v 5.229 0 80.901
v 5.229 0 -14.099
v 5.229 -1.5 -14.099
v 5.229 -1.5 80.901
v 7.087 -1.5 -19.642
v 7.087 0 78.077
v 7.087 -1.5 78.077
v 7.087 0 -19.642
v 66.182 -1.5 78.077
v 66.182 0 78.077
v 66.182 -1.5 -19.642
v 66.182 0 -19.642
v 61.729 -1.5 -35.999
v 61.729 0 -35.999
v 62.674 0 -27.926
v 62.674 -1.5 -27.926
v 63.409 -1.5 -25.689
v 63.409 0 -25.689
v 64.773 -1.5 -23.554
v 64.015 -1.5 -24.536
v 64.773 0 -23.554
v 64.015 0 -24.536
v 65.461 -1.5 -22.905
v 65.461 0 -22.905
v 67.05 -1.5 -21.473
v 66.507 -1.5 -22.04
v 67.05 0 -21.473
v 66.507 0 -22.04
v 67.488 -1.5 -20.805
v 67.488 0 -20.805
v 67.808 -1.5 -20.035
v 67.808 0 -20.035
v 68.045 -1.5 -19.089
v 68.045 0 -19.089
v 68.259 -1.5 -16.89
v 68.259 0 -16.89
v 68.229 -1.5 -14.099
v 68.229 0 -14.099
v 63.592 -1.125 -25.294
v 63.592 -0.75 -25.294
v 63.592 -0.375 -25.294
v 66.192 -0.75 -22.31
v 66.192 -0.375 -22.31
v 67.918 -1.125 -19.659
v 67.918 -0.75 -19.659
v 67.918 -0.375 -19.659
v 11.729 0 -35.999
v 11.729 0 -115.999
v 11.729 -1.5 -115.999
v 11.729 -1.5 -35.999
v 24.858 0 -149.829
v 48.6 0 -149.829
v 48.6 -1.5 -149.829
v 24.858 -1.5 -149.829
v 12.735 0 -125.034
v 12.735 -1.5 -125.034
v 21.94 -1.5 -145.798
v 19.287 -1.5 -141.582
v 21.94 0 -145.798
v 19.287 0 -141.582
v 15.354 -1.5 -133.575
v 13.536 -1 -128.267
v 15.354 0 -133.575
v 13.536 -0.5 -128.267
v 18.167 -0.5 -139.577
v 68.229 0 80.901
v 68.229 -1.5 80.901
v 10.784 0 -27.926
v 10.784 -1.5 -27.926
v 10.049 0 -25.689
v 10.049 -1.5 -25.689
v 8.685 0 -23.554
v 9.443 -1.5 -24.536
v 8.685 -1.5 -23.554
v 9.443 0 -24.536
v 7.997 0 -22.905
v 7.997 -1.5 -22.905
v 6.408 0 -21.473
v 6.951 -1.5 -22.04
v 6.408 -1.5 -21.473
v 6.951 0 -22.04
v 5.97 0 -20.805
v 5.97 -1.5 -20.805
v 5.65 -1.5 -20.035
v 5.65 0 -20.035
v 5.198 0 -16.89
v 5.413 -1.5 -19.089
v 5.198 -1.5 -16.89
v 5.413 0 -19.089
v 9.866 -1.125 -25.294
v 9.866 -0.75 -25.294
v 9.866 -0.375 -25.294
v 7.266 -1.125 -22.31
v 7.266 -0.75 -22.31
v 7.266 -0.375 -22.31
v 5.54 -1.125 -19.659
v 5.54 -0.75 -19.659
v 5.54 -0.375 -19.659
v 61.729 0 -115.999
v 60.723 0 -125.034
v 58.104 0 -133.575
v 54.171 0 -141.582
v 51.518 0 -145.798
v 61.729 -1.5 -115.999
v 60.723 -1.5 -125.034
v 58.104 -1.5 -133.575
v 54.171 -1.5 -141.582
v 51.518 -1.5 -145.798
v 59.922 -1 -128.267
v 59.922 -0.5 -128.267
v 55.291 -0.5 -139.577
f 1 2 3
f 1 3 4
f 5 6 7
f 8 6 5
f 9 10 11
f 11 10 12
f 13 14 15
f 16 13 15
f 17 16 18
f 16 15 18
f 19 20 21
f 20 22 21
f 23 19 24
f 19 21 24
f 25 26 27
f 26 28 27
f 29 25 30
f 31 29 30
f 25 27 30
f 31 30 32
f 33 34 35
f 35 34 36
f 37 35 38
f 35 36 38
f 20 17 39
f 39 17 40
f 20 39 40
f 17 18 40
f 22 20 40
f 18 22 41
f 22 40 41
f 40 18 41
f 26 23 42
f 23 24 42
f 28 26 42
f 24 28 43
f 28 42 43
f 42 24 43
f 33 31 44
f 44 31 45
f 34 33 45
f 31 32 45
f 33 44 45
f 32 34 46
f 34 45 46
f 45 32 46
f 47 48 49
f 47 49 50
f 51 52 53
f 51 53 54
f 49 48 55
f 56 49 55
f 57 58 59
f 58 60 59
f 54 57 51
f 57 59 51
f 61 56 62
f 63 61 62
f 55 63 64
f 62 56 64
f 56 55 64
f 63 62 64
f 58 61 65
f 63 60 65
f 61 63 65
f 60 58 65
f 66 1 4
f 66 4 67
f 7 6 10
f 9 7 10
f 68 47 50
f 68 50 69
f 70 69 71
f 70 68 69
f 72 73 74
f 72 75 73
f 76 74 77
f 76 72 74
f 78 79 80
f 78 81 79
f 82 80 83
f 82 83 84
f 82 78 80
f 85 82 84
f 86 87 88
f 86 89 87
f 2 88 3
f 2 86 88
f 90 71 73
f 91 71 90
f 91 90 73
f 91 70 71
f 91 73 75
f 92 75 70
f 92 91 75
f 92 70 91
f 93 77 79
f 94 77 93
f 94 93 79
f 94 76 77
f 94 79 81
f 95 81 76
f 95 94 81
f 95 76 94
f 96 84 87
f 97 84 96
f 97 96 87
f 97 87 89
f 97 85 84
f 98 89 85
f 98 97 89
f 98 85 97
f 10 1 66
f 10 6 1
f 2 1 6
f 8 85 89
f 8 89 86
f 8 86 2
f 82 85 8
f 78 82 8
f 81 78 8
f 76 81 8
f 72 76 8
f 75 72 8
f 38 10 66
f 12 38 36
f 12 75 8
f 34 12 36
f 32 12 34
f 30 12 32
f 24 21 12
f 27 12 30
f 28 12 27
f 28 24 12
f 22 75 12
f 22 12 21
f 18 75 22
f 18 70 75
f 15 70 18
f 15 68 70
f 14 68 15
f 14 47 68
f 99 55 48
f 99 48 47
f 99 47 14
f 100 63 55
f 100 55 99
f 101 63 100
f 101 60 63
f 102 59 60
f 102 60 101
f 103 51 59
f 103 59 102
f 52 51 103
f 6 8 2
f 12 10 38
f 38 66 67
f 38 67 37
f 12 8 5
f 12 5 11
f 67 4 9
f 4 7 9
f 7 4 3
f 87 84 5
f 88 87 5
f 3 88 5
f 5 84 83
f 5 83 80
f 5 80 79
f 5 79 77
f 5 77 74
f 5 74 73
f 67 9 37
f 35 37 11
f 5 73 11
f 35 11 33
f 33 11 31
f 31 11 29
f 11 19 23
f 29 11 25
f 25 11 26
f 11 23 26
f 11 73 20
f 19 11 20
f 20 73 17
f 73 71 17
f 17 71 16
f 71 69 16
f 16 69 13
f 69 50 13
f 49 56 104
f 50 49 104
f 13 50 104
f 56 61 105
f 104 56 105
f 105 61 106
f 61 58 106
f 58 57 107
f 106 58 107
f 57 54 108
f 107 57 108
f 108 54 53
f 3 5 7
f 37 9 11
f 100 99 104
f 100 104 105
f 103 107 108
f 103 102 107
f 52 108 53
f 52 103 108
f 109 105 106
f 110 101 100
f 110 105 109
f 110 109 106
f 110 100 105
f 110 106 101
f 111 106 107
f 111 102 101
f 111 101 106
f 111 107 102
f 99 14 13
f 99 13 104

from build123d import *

# Parameters (mm, degrees)
BOSS_EXTRUDE1_DEPTH = 1.5
SKETCH17_W          = 59.095547363
SKETCH17_H          = 97.719033267
CUT_EXTRUDE2_DEPTH  = 165.658179571


with BuildPart() as part:
    # Sketch1 → Boss-Extrude1 (new body)
    with BuildSketch(Plane(origin=(0, 0, 0), x_dir=(-1, 0, 0), z_dir=(0, -1, 0))):
        with BuildLine():
            Line((-68.228994051, -80.900990016), (-68.228994051, 14.099009984))
            add(Edge.make_bspline(
                [(-61.728994051, 35.999084059), (-62.421478219, 17.933639863), (-67.544211434, 25.081077147), (-68.540266051, 21.159243181), (-68.228994051, 14.099009984)],
                knots=[0, 0, 0, 0, 0, 1, 1, 1, 1, 1], degree=4))
            Line((-61.728994051, 35.999084059), (-61.728994051, 115.999084059))
            add(Edge.make_bspline(
                [(-61.728994051, 115.999084059), (-61.589708219, 128.711907965), (-56.064830782, 140.140701438), (-48.600220127, 149.828937742)],
                knots=[0, 0, 0, 0, 1, 1, 1, 1], degree=3))
            Line((-48.600220127, 149.828937742), (-24.857767976, 149.828937742))
            add(Edge.make_bspline(
                [(-11.728994051, 115.999084059), (-11.868279883, 128.711907965), (-17.39315732, 140.140701438), (-24.857767976, 149.828937742)],
                knots=[0, 0, 0, 0, 1, 1, 1, 1], degree=3))
            Line((-11.728994051, 115.999084059), (-11.728994051, 35.999084059))
            add(Edge.make_bspline(
                [(-11.728994051, 35.999084059), (-11.036509883, 17.933639863), (-5.913776668, 25.081077147), (-4.917722051, 21.159243181), (-5.228994051, 14.099009984)],
                knots=[0, 0, 0, 0, 0, 1, 1, 1, 1, 1], degree=4))
            Line((-5.228994051, 14.099009984), (-5.228994051, -80.900990016))
            Line((-5.228994051, -80.900990016), (-68.228994051, -80.900990016))
        make_face()
    extrude(amount=BOSS_EXTRUDE1_DEPTH)

    # Sketch17 → Cut-Extrude2 (cut, through all)
    with BuildSketch(Plane(origin=(0, 0, 0), x_dir=(1, 0, 0), z_dir=(0, 1, 0))):
        with Locations((36.634404956, -29.217068725)):
            Rectangle(SKETCH17_W, SKETCH17_H)
    extrude(amount=-CUT_EXTRUDE2_DEPTH, mode=Mode.SUBTRACT)


solid = part.part
